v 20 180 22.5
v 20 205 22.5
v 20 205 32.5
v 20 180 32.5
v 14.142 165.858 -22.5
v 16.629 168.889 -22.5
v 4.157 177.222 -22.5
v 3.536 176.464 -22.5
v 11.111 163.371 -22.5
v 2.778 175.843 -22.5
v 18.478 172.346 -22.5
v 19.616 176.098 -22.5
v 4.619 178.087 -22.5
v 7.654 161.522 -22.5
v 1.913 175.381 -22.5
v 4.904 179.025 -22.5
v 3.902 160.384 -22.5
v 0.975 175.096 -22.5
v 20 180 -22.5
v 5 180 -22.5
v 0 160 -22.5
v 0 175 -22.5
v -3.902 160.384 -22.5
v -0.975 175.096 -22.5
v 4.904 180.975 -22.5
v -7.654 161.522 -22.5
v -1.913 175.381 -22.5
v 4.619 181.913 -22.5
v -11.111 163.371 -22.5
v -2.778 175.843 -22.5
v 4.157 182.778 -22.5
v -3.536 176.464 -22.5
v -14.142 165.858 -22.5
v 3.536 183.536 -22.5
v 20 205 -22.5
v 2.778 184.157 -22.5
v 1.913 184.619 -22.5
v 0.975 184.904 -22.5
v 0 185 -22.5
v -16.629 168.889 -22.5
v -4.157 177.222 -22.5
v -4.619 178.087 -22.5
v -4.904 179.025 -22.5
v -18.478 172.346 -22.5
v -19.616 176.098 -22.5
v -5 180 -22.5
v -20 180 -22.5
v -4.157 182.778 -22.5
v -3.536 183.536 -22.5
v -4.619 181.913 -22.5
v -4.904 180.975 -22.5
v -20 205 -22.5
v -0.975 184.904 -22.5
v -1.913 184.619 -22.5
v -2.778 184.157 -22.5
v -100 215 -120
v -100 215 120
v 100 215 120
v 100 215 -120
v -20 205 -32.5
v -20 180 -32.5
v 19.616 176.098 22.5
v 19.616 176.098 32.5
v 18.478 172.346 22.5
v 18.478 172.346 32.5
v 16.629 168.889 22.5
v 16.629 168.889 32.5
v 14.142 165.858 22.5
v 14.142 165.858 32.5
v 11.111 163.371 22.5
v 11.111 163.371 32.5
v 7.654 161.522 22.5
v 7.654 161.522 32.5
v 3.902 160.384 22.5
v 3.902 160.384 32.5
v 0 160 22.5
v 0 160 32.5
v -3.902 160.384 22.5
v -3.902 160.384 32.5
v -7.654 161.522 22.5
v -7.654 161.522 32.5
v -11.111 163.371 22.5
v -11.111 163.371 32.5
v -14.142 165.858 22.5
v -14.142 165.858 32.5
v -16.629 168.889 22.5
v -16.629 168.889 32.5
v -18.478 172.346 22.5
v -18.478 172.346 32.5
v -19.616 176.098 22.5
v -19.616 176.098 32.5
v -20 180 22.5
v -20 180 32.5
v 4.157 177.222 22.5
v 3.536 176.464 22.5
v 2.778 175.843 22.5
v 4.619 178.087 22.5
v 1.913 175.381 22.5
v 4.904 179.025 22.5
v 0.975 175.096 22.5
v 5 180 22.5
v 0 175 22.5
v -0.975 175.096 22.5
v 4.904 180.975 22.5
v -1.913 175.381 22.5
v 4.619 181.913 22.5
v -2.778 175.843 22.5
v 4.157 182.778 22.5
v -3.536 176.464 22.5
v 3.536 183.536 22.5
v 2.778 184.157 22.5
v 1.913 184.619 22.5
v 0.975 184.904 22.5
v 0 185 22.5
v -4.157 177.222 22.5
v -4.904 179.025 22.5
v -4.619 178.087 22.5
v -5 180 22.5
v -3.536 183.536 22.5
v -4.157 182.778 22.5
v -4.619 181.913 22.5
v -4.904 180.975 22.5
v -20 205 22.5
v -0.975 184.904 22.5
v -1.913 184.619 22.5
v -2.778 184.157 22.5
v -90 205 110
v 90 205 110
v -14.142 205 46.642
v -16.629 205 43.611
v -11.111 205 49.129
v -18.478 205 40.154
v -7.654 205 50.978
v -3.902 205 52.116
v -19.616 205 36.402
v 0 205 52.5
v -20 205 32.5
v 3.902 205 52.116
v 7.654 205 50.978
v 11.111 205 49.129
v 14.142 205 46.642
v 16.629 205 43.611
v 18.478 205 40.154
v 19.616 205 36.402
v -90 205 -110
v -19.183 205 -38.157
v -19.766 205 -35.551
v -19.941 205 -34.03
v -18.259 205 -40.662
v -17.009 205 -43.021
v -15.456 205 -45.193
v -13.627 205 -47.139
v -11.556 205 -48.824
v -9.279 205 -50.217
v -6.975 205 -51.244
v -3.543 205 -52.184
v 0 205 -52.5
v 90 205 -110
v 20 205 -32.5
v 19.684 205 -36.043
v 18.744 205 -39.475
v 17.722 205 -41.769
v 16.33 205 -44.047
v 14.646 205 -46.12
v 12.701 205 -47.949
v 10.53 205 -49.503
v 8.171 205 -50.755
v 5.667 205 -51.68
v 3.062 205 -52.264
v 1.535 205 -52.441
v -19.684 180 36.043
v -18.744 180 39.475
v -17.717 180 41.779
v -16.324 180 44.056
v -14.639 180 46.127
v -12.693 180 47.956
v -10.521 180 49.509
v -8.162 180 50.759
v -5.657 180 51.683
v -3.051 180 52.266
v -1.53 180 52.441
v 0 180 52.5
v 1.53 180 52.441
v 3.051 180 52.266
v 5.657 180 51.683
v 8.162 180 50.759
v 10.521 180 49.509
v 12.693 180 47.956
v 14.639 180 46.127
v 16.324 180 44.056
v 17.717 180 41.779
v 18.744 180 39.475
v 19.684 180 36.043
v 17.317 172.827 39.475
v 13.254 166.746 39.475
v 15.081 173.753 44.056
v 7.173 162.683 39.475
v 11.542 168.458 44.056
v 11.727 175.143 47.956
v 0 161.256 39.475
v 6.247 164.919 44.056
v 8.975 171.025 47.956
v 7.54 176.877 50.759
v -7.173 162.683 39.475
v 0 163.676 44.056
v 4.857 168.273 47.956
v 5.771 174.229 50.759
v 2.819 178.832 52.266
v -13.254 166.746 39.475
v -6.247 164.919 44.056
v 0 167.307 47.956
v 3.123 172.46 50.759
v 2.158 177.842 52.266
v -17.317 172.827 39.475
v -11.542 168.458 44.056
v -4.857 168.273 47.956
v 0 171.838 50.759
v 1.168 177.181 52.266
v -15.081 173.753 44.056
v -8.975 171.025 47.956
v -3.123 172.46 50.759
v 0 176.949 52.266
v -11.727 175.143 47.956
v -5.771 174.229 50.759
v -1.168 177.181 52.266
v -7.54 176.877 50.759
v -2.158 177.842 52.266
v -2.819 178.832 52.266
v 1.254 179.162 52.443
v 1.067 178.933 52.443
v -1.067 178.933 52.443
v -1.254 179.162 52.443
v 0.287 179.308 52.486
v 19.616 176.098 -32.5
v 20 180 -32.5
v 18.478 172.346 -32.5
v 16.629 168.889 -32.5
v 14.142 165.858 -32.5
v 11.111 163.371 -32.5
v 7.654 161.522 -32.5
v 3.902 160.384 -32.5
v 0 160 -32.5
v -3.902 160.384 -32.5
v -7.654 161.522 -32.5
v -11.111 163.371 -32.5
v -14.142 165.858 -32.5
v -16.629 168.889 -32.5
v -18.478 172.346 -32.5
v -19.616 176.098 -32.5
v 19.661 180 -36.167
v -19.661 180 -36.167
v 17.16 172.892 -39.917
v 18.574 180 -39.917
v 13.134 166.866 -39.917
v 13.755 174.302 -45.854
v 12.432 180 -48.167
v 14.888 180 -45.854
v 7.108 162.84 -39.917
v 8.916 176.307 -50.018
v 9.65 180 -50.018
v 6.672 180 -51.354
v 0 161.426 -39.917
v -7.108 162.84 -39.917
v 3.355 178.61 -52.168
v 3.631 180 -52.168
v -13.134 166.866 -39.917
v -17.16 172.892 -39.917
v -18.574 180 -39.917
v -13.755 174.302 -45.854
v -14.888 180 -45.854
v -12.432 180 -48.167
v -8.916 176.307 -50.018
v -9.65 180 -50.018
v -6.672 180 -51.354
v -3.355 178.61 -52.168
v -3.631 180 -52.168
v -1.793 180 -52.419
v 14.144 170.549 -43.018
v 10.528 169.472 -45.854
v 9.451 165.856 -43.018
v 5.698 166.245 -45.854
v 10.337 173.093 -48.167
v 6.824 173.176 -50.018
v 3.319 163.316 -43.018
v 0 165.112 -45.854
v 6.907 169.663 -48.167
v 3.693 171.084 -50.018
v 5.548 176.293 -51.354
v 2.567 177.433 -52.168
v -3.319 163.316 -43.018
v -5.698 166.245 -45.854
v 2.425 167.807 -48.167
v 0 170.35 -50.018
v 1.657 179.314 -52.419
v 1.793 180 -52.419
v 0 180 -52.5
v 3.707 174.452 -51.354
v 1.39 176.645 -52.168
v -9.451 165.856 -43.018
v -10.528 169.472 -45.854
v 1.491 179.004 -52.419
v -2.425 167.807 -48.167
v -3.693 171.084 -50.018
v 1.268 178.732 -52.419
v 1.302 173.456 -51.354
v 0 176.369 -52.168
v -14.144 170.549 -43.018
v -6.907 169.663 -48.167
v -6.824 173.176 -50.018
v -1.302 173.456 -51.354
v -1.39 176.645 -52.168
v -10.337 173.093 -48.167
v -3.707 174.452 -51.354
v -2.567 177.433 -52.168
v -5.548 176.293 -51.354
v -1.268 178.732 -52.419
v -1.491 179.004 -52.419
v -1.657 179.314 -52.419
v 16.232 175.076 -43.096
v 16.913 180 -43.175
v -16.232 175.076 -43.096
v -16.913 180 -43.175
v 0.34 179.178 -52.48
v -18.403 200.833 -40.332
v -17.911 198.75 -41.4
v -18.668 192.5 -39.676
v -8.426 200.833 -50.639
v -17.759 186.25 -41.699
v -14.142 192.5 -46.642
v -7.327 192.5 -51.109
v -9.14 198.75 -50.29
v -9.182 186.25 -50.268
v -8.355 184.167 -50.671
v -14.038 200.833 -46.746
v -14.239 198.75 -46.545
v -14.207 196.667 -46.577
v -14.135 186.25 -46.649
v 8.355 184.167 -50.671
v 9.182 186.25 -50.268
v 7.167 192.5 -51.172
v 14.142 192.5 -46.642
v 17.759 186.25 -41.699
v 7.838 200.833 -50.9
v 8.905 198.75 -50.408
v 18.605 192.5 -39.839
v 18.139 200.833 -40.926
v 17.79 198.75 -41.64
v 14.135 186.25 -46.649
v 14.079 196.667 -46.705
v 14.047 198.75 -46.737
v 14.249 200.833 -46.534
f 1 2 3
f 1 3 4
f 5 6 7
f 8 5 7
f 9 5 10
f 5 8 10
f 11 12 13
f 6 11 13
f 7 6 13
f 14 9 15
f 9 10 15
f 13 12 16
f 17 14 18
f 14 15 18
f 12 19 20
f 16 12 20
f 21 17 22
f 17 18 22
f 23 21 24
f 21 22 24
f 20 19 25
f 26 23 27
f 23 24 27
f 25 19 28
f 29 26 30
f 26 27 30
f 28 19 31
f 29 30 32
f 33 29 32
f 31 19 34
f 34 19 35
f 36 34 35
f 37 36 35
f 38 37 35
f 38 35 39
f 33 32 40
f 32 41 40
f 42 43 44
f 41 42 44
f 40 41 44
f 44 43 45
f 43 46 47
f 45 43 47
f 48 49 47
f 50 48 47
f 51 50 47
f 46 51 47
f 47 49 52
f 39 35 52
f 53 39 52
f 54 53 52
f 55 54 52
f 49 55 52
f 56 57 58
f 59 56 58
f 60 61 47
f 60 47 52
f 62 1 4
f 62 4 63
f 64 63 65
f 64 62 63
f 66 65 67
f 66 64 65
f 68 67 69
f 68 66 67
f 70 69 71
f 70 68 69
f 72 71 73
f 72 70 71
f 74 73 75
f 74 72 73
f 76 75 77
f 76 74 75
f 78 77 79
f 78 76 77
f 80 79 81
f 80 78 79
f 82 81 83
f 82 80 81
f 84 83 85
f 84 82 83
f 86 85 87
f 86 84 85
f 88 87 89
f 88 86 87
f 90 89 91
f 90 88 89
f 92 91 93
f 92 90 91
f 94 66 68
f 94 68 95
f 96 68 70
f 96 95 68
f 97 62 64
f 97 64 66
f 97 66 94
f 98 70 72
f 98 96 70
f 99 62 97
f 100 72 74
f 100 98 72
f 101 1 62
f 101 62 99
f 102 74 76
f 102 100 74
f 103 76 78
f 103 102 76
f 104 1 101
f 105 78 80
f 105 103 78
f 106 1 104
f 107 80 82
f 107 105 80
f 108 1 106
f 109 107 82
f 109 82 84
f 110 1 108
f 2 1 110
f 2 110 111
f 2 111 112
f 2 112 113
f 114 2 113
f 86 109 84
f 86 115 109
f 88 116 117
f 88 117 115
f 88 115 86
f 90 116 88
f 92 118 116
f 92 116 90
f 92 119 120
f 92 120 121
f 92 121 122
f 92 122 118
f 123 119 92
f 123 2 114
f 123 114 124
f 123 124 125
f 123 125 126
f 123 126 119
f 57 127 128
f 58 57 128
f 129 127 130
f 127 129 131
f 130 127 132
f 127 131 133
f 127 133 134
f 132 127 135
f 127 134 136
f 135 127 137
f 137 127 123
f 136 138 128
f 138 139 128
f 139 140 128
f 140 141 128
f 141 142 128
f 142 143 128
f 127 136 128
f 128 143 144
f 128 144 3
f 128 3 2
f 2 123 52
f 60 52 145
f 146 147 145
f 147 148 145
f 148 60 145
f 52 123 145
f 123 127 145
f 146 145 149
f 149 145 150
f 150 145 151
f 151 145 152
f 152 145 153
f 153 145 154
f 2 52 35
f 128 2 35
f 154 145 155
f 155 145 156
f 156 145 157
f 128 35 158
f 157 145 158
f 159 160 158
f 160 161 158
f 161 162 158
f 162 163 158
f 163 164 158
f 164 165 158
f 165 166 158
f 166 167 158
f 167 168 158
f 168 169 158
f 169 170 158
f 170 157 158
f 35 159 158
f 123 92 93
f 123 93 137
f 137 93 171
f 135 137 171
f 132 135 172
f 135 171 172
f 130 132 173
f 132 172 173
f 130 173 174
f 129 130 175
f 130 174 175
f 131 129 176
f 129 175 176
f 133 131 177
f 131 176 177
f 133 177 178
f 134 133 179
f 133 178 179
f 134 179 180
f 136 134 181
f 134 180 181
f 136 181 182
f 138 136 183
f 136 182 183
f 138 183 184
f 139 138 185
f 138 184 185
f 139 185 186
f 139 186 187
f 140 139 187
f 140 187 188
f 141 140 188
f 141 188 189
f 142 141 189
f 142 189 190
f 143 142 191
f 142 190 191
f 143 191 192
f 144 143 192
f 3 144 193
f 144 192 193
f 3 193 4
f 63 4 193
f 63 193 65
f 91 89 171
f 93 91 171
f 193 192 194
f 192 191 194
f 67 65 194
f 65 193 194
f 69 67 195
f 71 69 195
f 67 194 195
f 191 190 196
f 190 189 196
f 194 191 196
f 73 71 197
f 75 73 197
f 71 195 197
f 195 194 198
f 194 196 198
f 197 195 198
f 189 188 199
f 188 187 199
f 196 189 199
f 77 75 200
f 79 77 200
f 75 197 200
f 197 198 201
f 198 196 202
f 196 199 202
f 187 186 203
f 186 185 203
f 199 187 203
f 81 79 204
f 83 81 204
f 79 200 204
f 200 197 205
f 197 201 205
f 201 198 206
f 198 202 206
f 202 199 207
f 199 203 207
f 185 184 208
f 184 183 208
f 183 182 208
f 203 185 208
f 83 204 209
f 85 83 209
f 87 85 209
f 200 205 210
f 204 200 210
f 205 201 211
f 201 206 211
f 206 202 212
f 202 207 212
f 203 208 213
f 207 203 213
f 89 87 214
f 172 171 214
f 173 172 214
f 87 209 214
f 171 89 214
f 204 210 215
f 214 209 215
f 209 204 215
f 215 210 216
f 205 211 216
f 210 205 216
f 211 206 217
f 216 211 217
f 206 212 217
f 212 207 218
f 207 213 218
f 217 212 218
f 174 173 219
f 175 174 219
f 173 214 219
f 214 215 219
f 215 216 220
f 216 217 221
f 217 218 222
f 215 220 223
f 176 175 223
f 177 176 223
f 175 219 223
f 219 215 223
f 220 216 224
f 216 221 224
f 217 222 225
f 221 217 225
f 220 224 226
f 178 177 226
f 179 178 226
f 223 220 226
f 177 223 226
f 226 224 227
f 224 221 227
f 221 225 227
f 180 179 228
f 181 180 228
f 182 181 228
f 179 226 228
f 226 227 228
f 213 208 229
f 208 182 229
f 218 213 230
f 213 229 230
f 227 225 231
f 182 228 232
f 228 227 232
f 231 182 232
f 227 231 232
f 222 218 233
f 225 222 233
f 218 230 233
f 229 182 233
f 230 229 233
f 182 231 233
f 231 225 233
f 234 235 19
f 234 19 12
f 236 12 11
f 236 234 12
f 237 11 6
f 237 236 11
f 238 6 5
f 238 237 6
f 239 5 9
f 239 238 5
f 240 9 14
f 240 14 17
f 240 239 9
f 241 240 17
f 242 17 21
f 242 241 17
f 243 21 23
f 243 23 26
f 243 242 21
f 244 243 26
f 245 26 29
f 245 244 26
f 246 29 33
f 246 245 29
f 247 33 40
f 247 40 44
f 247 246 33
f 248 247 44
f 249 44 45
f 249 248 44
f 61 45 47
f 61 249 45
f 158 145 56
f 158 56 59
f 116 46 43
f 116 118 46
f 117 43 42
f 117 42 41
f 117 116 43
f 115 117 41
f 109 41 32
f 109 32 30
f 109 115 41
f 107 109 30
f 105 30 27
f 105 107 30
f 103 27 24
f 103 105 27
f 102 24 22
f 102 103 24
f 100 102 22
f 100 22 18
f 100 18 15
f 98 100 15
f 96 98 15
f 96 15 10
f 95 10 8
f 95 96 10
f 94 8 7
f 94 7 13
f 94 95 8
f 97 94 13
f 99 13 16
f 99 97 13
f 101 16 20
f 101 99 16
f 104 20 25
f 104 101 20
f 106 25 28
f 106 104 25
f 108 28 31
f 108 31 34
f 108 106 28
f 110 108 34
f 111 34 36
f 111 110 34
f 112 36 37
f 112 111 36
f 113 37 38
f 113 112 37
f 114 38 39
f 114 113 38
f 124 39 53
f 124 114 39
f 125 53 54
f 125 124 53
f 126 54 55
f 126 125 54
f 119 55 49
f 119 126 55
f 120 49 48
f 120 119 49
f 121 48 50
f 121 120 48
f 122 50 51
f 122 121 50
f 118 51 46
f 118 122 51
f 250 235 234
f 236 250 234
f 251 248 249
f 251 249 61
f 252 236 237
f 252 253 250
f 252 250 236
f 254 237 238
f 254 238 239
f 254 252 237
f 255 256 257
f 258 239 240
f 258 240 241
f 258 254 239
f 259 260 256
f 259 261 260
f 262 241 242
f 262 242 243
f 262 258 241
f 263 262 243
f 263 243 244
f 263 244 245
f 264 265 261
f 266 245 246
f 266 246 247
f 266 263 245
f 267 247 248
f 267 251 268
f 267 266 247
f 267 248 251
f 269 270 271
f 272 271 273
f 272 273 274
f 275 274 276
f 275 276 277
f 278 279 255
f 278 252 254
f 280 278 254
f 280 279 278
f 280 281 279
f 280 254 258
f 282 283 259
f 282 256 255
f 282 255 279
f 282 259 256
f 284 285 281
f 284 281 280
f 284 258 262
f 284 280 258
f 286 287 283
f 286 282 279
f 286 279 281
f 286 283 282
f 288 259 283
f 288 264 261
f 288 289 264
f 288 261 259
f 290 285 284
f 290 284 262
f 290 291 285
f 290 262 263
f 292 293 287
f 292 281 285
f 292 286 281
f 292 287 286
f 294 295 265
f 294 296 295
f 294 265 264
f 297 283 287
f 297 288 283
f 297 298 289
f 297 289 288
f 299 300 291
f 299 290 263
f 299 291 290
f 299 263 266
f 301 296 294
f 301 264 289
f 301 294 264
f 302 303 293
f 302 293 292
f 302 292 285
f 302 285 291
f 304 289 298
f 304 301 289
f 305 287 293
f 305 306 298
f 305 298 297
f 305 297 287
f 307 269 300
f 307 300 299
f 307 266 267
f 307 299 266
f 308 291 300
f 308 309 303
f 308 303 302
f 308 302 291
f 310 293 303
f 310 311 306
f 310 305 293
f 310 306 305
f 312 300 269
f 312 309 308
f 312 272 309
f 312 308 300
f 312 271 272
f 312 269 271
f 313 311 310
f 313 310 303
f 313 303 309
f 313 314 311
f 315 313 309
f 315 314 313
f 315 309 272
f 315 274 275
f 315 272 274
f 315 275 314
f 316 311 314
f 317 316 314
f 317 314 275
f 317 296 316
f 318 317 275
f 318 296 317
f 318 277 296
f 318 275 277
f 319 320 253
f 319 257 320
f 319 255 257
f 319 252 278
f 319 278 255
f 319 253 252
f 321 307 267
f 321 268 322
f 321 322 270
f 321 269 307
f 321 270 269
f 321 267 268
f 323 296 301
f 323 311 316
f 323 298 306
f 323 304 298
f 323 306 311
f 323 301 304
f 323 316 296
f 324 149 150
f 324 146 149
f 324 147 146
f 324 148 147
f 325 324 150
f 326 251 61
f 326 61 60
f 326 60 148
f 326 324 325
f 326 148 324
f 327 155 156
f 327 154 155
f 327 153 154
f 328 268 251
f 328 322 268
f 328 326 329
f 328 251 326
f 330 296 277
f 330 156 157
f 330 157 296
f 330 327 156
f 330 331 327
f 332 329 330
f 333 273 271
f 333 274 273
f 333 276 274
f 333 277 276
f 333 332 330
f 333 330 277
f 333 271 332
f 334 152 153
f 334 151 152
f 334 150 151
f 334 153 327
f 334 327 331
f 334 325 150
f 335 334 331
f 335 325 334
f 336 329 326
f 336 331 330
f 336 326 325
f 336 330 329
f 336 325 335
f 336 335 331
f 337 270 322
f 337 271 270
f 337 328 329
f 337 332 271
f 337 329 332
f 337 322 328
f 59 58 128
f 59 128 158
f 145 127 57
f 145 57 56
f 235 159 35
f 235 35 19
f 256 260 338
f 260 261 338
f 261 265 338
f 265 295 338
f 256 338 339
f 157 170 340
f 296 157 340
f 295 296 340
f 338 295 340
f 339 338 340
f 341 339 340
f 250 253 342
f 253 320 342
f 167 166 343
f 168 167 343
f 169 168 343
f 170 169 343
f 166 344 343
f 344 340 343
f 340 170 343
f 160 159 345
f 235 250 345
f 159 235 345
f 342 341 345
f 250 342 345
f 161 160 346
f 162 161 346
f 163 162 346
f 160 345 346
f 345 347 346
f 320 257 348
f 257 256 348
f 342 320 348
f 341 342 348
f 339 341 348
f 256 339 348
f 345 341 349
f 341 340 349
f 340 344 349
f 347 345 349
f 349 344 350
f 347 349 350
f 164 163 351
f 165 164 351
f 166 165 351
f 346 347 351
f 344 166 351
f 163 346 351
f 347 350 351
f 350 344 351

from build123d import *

# Parameters (mm, degrees)
SKETCH1_R           = 5
BOSS_EXTRUDE1_DEPTH = 22.5
BOSS_EXTRUDE4_DEPTH = 10
BOSS_EXTRUDE5_DEPTH = 20
FILLET1_SIZE        = 20
BOSS_EXTRUDE6_DEPTH = 25
BOSS_EXTRUDE7_START = 30
BOSS_EXTRUDE7_DEPTH = 30
FILLET3_SIZE        = 20
SKETCH8_W           = 200
SKETCH8_H           = 240
BOSS_EXTRUDE8_DEPTH = 10
CHAMFER1_SIZE       = 10


# Some blends are built 0.0001 mm under size
with BuildPart() as part:
    # Sketch1 → Boss-Extrude1 (new, symmetric)
    with BuildSketch(Plane.XY):
        with Locations(Location((0, 180, 0), (0, 0, 180))):
            Circle(SKETCH1_R)
    extrude(amount=BOSS_EXTRUDE1_DEPTH, both=True)

    # Sketch4 → Boss-Extrude4 (add)
    with BuildSketch(Plane.XY.offset(22.5)):
        with BuildLine():
            Line((-20, 180), (-20, 205))
            Line((-20, 205), (20, 205))
            Line((20, 205), (20, 180))
            ThreePointArc((20, 180), (0, 160), (-20, 180))
        make_face()
    extrude(amount=BOSS_EXTRUDE4_DEPTH)

    # Sketch5 → Boss-Extrude5 (add)
    with BuildSketch(Plane.XY.offset(32.5)):
        with BuildLine():
            Line((-20, 180), (20, 180))
            ThreePointArc((20, 180), (0, 160), (-20, 180))
        make_face()
    extrude(amount=BOSS_EXTRUDE5_DEPTH)

    # Fillet1
    # a fillet whose section is not a circle: 20 mm, written as the material it takes off along each edge
    with BuildSketch(Plane(origin=(0, 180, 52.5), x_dir=(0.003141587485879206, 0.9999950652018581, 0), z_dir=(-0.9999950652018581, 0.003141587485879206, 0))) as fillet1_piece_1:
        with BuildLine():
            Bezier((20, FILLET1_SIZE), (20, 0), (20 - FILLET1_SIZE, 0), weights=[1, 0.707106781, 1])
            Line((20 - FILLET1_SIZE, 0), (20, 0))
            Line((20, 0), (20, FILLET1_SIZE))
        make_face()
    revolve(axis=Axis((0, 180, 52.5), (0, 0, -1)), revolution_arc=359.64, mode=Mode.SUBTRACT)

    # Sketch6 → Boss-Extrude6 (add)
    with BuildSketch(Plane(origin=(0, 180, 0), x_dir=(1, 0, 0), z_dir=(0, 1, 0))):
        with BuildLine():
            Line((20, -32.5), (-20, -32.5))
            ThreePointArc((-20, -32.5), (0, -52.5), (20, -32.5))
        make_face()
    extrude(amount=BOSS_EXTRUDE6_DEPTH)

    # Sketch7 → Boss-Extrude7 (add)
    with BuildSketch(Plane(origin=(0, 0, -22.5), x_dir=(-1, 0, 0), z_dir=(0, 0, -1)).offset(BOSS_EXTRUDE7_START)):
        with BuildLine():
            Line((20, 180), (20, 205))
            Line((20, 205), (-20, 205))
            Line((-20, 205), (-20, 180))
            ThreePointArc((-20, 180), (0, 160), (20, 180))
        make_face()
    extrude(amount=-BOSS_EXTRUDE7_DEPTH)

    # Fillet3
    # a fillet whose section is not a circle: 20 mm, written as the material it takes off along each edge
    with BuildSketch(Plane(origin=(0, 180, -52.5), x_dir=(1, 0, 0), z_dir=(0, 1, 0))) as fillet3_piece_1:
        with BuildLine():
            Bezier((20, -FILLET3_SIZE), (20, 0), (20 - FILLET3_SIZE, 0), weights=[1, 0.707106781, 1])
            Line((20 - FILLET3_SIZE, 0), (20, 0))
            Line((20, 0), (20, -FILLET3_SIZE))
        make_face()
    revolve(axis=Axis((0, 180, -52.5), (0, 0, -1)), revolution_arc=180, mode=Mode.SUBTRACT)
    with BuildSketch(Plane(origin=(20, 255, -52.5), x_dir=(-1, 0, 0), z_dir=(0, -1, 0))) as fillet3_piece_2:
        with BuildLine():
            Bezier((FILLET3_SIZE, 0), (0, 0), (0, -FILLET3_SIZE), weights=[1, 0.707106781, 1])
            Line((0, -FILLET3_SIZE), (0, 0))
            Line((0, 0), (FILLET3_SIZE, 0))
        make_face()
    extrude(amount=75, mode=Mode.SUBTRACT)
    with BuildSketch(Plane(origin=(-20, 180, -52.5), x_dir=(0, 0, 1), z_dir=(0, 1, 0))) as fillet3_piece_3:
        with BuildLine():
            Bezier((FILLET3_SIZE, 0), (0, 0), (0, FILLET3_SIZE), weights=[1, 0.707106781, 1])
            Line((0, FILLET3_SIZE), (0, 0))
            Line((0, 0), (FILLET3_SIZE, 0))
        make_face()
    extrude(amount=75, mode=Mode.SUBTRACT)

    # Sketch8 → Boss-Extrude8 (add)
    with BuildSketch(Plane(origin=(0, 205, 0), x_dir=(1, 0, 0), z_dir=(0, 1, 0))):
        Rectangle(SKETCH8_W, SKETCH8_H)
    extrude(amount=BOSS_EXTRUDE8_DEPTH)

    # Chamfer1
    chamfer1_edges = [part.edges().sort_by_distance(p)[0] for p in [
        (100, 205, 0),
        (0, 205, -120),
        (-100, 205, 0),
        (0, 205, 120),
    ]]
    chamfer(chamfer1_edges, length=CHAMFER1_SIZE - 0.0001)  # a hair under: the kernel refuses the full size


solid = part.part
